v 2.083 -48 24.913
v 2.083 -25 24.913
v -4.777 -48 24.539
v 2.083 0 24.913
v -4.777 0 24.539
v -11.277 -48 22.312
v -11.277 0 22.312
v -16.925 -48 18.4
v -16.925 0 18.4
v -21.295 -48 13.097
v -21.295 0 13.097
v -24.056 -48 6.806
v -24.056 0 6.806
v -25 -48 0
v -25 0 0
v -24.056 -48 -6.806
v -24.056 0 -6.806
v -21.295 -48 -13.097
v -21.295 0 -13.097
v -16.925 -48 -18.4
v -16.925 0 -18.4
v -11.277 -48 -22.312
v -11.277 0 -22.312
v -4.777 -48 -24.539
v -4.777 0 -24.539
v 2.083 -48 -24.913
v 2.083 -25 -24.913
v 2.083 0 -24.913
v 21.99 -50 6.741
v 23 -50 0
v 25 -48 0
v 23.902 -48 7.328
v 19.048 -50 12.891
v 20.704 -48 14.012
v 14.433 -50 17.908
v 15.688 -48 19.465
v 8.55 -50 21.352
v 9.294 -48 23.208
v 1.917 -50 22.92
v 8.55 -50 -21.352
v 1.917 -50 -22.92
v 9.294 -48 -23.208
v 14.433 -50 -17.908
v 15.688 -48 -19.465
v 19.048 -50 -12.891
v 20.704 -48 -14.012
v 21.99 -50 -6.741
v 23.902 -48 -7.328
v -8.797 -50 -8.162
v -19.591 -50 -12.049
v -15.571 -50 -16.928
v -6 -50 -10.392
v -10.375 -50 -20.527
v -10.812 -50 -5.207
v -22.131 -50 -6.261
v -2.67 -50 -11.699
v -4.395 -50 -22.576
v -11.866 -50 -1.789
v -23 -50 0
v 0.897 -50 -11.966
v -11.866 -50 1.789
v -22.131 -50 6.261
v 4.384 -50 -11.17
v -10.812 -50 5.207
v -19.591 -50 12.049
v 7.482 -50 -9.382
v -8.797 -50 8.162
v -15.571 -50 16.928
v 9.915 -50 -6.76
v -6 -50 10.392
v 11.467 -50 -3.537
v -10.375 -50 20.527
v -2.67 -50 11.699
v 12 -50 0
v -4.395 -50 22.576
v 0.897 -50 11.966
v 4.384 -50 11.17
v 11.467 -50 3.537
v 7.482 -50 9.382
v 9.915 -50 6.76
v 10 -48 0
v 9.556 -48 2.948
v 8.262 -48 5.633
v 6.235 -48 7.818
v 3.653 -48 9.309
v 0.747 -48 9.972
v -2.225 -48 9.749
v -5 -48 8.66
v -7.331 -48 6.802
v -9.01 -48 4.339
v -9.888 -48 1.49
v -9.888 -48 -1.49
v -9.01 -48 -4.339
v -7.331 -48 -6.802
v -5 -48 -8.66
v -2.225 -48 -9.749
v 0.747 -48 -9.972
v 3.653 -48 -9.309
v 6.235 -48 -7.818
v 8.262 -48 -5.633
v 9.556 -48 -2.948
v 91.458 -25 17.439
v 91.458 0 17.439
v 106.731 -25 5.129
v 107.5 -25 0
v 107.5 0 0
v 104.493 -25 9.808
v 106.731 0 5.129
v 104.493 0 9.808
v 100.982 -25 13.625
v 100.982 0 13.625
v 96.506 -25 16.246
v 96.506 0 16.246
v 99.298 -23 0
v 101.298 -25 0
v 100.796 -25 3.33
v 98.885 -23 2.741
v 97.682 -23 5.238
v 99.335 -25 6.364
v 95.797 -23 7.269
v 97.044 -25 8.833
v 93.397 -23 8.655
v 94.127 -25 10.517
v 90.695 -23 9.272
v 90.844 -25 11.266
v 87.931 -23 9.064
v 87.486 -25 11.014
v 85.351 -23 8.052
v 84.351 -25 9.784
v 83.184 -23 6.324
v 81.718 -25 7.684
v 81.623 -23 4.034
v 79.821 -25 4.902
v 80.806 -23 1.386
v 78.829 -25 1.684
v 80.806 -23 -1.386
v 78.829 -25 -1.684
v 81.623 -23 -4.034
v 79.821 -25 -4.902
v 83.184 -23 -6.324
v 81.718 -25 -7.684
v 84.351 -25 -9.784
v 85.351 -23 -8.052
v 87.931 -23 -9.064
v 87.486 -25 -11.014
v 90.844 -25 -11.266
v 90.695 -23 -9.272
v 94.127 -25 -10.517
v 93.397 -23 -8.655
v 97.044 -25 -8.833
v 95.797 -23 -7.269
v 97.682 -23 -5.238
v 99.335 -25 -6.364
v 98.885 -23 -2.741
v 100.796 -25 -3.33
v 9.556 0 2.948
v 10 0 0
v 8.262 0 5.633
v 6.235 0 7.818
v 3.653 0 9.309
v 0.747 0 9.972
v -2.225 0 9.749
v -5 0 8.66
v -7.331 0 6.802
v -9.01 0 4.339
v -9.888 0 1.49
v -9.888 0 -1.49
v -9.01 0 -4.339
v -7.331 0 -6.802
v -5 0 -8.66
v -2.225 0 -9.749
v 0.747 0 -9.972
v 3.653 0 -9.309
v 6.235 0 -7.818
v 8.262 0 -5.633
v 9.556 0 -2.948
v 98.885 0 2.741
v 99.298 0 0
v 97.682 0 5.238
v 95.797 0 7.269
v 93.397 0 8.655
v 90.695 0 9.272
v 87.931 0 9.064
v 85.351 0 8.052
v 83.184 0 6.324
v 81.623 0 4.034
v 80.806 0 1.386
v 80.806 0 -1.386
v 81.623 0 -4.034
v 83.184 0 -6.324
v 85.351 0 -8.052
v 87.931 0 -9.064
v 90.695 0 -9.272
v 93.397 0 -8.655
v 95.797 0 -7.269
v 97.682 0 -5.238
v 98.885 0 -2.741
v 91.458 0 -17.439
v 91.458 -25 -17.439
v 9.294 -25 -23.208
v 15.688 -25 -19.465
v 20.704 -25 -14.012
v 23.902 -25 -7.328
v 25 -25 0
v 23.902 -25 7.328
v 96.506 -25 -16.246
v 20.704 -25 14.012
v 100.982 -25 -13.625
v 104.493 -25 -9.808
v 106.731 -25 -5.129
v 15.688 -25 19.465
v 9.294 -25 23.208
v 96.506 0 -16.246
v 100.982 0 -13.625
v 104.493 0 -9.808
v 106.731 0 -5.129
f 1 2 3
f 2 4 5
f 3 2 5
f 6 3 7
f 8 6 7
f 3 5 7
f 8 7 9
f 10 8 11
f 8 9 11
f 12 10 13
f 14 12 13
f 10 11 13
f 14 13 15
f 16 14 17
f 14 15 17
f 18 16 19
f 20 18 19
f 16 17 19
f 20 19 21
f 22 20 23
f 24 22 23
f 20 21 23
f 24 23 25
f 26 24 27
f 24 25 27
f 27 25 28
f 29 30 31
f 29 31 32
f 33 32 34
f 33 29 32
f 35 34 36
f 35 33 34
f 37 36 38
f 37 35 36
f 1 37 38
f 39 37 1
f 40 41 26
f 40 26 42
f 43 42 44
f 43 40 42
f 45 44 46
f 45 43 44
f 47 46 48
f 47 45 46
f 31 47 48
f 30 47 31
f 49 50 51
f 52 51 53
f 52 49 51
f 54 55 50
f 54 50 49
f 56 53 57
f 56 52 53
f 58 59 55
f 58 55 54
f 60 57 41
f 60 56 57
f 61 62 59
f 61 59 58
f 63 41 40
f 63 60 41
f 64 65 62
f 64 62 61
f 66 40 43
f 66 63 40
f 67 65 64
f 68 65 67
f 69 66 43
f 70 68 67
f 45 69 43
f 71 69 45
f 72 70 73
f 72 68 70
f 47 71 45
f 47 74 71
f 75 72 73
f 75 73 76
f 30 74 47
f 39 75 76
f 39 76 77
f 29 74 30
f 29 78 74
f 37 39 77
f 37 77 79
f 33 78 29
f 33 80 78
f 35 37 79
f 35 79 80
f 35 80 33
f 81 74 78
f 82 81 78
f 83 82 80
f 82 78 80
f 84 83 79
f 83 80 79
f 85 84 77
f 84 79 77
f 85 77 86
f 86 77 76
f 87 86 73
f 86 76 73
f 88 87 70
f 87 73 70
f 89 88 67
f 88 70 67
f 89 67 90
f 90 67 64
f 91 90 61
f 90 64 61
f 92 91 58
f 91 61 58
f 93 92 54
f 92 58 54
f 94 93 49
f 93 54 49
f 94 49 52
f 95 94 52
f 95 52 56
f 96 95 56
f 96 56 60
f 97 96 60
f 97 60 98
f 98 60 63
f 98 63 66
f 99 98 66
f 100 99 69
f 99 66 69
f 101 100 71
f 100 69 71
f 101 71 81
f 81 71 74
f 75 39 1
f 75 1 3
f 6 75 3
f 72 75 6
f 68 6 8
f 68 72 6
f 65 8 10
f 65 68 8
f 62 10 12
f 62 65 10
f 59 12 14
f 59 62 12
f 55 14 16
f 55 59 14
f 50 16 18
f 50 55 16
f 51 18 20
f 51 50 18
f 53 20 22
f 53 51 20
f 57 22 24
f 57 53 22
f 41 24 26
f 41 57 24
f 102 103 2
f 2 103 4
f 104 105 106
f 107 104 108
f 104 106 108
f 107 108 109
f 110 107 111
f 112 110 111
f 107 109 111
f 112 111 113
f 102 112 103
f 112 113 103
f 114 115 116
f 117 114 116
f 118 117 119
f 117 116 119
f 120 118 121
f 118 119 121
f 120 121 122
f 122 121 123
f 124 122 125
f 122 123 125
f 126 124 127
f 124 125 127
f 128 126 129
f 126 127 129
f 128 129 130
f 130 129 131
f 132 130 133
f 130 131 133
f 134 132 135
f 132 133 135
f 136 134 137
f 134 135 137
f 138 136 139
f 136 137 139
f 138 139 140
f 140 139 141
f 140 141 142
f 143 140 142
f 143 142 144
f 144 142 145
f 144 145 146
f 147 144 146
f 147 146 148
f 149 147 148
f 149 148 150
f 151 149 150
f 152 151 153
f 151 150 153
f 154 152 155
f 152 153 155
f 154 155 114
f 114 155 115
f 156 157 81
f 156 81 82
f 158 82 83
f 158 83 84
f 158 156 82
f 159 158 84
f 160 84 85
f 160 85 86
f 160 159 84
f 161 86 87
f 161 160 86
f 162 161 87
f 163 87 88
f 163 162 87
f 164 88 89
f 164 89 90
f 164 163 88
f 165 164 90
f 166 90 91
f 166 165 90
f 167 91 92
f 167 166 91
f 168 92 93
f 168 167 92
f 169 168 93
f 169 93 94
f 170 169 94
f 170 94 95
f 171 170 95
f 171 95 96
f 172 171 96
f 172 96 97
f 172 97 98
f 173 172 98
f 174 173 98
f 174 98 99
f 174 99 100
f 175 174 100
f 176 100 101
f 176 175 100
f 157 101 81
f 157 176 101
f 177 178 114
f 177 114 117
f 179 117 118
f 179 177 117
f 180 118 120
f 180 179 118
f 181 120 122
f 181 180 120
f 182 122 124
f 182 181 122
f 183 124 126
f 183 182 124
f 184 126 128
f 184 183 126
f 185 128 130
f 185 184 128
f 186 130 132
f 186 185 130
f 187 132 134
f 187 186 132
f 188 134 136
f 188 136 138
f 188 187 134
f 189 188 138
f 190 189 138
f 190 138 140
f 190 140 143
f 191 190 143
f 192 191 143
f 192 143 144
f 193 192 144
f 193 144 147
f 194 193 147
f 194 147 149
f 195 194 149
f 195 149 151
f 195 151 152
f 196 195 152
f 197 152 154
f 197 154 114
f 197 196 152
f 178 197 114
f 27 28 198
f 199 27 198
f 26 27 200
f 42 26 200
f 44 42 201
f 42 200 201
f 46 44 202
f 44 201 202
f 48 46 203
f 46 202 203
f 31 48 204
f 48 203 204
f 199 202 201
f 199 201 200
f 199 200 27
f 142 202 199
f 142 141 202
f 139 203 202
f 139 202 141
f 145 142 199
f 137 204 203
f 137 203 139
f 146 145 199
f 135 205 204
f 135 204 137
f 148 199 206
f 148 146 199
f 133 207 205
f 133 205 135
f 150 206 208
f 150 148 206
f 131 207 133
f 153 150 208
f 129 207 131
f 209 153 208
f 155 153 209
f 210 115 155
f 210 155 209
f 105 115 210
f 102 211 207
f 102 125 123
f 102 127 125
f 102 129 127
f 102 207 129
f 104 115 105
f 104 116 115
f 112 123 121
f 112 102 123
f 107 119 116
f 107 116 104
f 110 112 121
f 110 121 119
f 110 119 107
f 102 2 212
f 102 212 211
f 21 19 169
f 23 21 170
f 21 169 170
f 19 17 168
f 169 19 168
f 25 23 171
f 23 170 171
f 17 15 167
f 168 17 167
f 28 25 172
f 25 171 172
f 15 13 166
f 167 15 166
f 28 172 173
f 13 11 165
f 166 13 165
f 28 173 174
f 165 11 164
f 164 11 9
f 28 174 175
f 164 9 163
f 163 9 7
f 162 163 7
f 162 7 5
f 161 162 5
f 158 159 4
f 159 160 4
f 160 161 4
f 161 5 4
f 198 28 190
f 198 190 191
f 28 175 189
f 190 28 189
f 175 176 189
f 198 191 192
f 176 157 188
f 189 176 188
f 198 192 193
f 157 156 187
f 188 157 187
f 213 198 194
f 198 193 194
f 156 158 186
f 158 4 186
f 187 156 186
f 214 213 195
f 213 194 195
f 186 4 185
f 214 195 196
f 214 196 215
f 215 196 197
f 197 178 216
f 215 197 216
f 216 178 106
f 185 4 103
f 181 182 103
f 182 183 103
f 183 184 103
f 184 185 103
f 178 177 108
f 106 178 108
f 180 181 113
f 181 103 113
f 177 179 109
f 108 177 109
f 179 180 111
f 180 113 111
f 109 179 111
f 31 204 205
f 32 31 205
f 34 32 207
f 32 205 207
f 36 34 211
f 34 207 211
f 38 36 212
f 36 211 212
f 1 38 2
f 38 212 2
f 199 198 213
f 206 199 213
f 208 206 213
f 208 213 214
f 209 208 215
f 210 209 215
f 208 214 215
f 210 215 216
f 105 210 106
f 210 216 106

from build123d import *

# Parameters (mm, degrees)
F0_R     = 10
F0_R_2   = 9.297585
F1_DEPTH = 25
F2_DEPTH = 50
F3_SIZE  = 2


with BuildPart() as f1:
    # F0 (on Front) → F1 (new body)
    with BuildSketch(Plane.XZ):
        with BuildLine():
            ThreePointArc((2.083333, -24.913043), (18.399502, -16.92508), (25, 0))
            ThreePointArc((25, 0), (18.399502, 16.92508), (2.083333, 24.913043))
            ThreePointArc((2.083333, 24.913043), (-25, 0), (2.083333, -24.913043))
        make_face()
        Circle(F0_R, mode=Mode.SUBTRACT)
        with BuildLine():
            ThreePointArc((2.083333, 24.913043), (18.399502, 16.92508), (25, 0))
            ThreePointArc((25, 0), (18.399502, -16.92508), (2.083333, -24.913043))
            Line((2.083333, -24.913043), (91.458333, -17.43913))
            ThreePointArc((91.458333, -17.43913), (72.5, 0), (91.458333, 17.43913))
            Line((91.458333, 17.43913), (2.083333, 24.913043))
        make_face()
        with BuildLine():
            ThreePointArc((107.5, 0), (102.879651, 11.847556), (91.458333, 17.43913))
            ThreePointArc((91.458333, 17.43913), (72.5, 0), (91.458333, -17.43913))
            ThreePointArc((91.458333, -17.43913), (102.879651, -11.847556), (107.5, 0))
        make_face()
        with Locations((90, 0)):
            Circle(F0_R_2, mode=Mode.SUBTRACT)
    extrude(amount=F1_DEPTH)

    # F0 (on Front) → F2 (join)
    with BuildSketch(Plane.XZ):
        with BuildLine():
            ThreePointArc((2.083333, -24.913043), (18.399502, -16.92508), (25, 0))
            ThreePointArc((25, 0), (18.399502, 16.92508), (2.083333, 24.913043))
            ThreePointArc((2.083333, 24.913043), (-25, 0), (2.083333, -24.913043))
        make_face()
        Circle(F0_R, mode=Mode.SUBTRACT)
    extrude(amount=F2_DEPTH)

    # F3
    f3_edges = [f1.edges().sort_by_distance(p)[0] for p in [
        (80.702415, -25, 0),
        (-10, -50, 0),
        (-2.083333, -50, 24.913043),
    ]]
    chamfer(f3_edges, length=F3_SIZE)


solid = f1.part
